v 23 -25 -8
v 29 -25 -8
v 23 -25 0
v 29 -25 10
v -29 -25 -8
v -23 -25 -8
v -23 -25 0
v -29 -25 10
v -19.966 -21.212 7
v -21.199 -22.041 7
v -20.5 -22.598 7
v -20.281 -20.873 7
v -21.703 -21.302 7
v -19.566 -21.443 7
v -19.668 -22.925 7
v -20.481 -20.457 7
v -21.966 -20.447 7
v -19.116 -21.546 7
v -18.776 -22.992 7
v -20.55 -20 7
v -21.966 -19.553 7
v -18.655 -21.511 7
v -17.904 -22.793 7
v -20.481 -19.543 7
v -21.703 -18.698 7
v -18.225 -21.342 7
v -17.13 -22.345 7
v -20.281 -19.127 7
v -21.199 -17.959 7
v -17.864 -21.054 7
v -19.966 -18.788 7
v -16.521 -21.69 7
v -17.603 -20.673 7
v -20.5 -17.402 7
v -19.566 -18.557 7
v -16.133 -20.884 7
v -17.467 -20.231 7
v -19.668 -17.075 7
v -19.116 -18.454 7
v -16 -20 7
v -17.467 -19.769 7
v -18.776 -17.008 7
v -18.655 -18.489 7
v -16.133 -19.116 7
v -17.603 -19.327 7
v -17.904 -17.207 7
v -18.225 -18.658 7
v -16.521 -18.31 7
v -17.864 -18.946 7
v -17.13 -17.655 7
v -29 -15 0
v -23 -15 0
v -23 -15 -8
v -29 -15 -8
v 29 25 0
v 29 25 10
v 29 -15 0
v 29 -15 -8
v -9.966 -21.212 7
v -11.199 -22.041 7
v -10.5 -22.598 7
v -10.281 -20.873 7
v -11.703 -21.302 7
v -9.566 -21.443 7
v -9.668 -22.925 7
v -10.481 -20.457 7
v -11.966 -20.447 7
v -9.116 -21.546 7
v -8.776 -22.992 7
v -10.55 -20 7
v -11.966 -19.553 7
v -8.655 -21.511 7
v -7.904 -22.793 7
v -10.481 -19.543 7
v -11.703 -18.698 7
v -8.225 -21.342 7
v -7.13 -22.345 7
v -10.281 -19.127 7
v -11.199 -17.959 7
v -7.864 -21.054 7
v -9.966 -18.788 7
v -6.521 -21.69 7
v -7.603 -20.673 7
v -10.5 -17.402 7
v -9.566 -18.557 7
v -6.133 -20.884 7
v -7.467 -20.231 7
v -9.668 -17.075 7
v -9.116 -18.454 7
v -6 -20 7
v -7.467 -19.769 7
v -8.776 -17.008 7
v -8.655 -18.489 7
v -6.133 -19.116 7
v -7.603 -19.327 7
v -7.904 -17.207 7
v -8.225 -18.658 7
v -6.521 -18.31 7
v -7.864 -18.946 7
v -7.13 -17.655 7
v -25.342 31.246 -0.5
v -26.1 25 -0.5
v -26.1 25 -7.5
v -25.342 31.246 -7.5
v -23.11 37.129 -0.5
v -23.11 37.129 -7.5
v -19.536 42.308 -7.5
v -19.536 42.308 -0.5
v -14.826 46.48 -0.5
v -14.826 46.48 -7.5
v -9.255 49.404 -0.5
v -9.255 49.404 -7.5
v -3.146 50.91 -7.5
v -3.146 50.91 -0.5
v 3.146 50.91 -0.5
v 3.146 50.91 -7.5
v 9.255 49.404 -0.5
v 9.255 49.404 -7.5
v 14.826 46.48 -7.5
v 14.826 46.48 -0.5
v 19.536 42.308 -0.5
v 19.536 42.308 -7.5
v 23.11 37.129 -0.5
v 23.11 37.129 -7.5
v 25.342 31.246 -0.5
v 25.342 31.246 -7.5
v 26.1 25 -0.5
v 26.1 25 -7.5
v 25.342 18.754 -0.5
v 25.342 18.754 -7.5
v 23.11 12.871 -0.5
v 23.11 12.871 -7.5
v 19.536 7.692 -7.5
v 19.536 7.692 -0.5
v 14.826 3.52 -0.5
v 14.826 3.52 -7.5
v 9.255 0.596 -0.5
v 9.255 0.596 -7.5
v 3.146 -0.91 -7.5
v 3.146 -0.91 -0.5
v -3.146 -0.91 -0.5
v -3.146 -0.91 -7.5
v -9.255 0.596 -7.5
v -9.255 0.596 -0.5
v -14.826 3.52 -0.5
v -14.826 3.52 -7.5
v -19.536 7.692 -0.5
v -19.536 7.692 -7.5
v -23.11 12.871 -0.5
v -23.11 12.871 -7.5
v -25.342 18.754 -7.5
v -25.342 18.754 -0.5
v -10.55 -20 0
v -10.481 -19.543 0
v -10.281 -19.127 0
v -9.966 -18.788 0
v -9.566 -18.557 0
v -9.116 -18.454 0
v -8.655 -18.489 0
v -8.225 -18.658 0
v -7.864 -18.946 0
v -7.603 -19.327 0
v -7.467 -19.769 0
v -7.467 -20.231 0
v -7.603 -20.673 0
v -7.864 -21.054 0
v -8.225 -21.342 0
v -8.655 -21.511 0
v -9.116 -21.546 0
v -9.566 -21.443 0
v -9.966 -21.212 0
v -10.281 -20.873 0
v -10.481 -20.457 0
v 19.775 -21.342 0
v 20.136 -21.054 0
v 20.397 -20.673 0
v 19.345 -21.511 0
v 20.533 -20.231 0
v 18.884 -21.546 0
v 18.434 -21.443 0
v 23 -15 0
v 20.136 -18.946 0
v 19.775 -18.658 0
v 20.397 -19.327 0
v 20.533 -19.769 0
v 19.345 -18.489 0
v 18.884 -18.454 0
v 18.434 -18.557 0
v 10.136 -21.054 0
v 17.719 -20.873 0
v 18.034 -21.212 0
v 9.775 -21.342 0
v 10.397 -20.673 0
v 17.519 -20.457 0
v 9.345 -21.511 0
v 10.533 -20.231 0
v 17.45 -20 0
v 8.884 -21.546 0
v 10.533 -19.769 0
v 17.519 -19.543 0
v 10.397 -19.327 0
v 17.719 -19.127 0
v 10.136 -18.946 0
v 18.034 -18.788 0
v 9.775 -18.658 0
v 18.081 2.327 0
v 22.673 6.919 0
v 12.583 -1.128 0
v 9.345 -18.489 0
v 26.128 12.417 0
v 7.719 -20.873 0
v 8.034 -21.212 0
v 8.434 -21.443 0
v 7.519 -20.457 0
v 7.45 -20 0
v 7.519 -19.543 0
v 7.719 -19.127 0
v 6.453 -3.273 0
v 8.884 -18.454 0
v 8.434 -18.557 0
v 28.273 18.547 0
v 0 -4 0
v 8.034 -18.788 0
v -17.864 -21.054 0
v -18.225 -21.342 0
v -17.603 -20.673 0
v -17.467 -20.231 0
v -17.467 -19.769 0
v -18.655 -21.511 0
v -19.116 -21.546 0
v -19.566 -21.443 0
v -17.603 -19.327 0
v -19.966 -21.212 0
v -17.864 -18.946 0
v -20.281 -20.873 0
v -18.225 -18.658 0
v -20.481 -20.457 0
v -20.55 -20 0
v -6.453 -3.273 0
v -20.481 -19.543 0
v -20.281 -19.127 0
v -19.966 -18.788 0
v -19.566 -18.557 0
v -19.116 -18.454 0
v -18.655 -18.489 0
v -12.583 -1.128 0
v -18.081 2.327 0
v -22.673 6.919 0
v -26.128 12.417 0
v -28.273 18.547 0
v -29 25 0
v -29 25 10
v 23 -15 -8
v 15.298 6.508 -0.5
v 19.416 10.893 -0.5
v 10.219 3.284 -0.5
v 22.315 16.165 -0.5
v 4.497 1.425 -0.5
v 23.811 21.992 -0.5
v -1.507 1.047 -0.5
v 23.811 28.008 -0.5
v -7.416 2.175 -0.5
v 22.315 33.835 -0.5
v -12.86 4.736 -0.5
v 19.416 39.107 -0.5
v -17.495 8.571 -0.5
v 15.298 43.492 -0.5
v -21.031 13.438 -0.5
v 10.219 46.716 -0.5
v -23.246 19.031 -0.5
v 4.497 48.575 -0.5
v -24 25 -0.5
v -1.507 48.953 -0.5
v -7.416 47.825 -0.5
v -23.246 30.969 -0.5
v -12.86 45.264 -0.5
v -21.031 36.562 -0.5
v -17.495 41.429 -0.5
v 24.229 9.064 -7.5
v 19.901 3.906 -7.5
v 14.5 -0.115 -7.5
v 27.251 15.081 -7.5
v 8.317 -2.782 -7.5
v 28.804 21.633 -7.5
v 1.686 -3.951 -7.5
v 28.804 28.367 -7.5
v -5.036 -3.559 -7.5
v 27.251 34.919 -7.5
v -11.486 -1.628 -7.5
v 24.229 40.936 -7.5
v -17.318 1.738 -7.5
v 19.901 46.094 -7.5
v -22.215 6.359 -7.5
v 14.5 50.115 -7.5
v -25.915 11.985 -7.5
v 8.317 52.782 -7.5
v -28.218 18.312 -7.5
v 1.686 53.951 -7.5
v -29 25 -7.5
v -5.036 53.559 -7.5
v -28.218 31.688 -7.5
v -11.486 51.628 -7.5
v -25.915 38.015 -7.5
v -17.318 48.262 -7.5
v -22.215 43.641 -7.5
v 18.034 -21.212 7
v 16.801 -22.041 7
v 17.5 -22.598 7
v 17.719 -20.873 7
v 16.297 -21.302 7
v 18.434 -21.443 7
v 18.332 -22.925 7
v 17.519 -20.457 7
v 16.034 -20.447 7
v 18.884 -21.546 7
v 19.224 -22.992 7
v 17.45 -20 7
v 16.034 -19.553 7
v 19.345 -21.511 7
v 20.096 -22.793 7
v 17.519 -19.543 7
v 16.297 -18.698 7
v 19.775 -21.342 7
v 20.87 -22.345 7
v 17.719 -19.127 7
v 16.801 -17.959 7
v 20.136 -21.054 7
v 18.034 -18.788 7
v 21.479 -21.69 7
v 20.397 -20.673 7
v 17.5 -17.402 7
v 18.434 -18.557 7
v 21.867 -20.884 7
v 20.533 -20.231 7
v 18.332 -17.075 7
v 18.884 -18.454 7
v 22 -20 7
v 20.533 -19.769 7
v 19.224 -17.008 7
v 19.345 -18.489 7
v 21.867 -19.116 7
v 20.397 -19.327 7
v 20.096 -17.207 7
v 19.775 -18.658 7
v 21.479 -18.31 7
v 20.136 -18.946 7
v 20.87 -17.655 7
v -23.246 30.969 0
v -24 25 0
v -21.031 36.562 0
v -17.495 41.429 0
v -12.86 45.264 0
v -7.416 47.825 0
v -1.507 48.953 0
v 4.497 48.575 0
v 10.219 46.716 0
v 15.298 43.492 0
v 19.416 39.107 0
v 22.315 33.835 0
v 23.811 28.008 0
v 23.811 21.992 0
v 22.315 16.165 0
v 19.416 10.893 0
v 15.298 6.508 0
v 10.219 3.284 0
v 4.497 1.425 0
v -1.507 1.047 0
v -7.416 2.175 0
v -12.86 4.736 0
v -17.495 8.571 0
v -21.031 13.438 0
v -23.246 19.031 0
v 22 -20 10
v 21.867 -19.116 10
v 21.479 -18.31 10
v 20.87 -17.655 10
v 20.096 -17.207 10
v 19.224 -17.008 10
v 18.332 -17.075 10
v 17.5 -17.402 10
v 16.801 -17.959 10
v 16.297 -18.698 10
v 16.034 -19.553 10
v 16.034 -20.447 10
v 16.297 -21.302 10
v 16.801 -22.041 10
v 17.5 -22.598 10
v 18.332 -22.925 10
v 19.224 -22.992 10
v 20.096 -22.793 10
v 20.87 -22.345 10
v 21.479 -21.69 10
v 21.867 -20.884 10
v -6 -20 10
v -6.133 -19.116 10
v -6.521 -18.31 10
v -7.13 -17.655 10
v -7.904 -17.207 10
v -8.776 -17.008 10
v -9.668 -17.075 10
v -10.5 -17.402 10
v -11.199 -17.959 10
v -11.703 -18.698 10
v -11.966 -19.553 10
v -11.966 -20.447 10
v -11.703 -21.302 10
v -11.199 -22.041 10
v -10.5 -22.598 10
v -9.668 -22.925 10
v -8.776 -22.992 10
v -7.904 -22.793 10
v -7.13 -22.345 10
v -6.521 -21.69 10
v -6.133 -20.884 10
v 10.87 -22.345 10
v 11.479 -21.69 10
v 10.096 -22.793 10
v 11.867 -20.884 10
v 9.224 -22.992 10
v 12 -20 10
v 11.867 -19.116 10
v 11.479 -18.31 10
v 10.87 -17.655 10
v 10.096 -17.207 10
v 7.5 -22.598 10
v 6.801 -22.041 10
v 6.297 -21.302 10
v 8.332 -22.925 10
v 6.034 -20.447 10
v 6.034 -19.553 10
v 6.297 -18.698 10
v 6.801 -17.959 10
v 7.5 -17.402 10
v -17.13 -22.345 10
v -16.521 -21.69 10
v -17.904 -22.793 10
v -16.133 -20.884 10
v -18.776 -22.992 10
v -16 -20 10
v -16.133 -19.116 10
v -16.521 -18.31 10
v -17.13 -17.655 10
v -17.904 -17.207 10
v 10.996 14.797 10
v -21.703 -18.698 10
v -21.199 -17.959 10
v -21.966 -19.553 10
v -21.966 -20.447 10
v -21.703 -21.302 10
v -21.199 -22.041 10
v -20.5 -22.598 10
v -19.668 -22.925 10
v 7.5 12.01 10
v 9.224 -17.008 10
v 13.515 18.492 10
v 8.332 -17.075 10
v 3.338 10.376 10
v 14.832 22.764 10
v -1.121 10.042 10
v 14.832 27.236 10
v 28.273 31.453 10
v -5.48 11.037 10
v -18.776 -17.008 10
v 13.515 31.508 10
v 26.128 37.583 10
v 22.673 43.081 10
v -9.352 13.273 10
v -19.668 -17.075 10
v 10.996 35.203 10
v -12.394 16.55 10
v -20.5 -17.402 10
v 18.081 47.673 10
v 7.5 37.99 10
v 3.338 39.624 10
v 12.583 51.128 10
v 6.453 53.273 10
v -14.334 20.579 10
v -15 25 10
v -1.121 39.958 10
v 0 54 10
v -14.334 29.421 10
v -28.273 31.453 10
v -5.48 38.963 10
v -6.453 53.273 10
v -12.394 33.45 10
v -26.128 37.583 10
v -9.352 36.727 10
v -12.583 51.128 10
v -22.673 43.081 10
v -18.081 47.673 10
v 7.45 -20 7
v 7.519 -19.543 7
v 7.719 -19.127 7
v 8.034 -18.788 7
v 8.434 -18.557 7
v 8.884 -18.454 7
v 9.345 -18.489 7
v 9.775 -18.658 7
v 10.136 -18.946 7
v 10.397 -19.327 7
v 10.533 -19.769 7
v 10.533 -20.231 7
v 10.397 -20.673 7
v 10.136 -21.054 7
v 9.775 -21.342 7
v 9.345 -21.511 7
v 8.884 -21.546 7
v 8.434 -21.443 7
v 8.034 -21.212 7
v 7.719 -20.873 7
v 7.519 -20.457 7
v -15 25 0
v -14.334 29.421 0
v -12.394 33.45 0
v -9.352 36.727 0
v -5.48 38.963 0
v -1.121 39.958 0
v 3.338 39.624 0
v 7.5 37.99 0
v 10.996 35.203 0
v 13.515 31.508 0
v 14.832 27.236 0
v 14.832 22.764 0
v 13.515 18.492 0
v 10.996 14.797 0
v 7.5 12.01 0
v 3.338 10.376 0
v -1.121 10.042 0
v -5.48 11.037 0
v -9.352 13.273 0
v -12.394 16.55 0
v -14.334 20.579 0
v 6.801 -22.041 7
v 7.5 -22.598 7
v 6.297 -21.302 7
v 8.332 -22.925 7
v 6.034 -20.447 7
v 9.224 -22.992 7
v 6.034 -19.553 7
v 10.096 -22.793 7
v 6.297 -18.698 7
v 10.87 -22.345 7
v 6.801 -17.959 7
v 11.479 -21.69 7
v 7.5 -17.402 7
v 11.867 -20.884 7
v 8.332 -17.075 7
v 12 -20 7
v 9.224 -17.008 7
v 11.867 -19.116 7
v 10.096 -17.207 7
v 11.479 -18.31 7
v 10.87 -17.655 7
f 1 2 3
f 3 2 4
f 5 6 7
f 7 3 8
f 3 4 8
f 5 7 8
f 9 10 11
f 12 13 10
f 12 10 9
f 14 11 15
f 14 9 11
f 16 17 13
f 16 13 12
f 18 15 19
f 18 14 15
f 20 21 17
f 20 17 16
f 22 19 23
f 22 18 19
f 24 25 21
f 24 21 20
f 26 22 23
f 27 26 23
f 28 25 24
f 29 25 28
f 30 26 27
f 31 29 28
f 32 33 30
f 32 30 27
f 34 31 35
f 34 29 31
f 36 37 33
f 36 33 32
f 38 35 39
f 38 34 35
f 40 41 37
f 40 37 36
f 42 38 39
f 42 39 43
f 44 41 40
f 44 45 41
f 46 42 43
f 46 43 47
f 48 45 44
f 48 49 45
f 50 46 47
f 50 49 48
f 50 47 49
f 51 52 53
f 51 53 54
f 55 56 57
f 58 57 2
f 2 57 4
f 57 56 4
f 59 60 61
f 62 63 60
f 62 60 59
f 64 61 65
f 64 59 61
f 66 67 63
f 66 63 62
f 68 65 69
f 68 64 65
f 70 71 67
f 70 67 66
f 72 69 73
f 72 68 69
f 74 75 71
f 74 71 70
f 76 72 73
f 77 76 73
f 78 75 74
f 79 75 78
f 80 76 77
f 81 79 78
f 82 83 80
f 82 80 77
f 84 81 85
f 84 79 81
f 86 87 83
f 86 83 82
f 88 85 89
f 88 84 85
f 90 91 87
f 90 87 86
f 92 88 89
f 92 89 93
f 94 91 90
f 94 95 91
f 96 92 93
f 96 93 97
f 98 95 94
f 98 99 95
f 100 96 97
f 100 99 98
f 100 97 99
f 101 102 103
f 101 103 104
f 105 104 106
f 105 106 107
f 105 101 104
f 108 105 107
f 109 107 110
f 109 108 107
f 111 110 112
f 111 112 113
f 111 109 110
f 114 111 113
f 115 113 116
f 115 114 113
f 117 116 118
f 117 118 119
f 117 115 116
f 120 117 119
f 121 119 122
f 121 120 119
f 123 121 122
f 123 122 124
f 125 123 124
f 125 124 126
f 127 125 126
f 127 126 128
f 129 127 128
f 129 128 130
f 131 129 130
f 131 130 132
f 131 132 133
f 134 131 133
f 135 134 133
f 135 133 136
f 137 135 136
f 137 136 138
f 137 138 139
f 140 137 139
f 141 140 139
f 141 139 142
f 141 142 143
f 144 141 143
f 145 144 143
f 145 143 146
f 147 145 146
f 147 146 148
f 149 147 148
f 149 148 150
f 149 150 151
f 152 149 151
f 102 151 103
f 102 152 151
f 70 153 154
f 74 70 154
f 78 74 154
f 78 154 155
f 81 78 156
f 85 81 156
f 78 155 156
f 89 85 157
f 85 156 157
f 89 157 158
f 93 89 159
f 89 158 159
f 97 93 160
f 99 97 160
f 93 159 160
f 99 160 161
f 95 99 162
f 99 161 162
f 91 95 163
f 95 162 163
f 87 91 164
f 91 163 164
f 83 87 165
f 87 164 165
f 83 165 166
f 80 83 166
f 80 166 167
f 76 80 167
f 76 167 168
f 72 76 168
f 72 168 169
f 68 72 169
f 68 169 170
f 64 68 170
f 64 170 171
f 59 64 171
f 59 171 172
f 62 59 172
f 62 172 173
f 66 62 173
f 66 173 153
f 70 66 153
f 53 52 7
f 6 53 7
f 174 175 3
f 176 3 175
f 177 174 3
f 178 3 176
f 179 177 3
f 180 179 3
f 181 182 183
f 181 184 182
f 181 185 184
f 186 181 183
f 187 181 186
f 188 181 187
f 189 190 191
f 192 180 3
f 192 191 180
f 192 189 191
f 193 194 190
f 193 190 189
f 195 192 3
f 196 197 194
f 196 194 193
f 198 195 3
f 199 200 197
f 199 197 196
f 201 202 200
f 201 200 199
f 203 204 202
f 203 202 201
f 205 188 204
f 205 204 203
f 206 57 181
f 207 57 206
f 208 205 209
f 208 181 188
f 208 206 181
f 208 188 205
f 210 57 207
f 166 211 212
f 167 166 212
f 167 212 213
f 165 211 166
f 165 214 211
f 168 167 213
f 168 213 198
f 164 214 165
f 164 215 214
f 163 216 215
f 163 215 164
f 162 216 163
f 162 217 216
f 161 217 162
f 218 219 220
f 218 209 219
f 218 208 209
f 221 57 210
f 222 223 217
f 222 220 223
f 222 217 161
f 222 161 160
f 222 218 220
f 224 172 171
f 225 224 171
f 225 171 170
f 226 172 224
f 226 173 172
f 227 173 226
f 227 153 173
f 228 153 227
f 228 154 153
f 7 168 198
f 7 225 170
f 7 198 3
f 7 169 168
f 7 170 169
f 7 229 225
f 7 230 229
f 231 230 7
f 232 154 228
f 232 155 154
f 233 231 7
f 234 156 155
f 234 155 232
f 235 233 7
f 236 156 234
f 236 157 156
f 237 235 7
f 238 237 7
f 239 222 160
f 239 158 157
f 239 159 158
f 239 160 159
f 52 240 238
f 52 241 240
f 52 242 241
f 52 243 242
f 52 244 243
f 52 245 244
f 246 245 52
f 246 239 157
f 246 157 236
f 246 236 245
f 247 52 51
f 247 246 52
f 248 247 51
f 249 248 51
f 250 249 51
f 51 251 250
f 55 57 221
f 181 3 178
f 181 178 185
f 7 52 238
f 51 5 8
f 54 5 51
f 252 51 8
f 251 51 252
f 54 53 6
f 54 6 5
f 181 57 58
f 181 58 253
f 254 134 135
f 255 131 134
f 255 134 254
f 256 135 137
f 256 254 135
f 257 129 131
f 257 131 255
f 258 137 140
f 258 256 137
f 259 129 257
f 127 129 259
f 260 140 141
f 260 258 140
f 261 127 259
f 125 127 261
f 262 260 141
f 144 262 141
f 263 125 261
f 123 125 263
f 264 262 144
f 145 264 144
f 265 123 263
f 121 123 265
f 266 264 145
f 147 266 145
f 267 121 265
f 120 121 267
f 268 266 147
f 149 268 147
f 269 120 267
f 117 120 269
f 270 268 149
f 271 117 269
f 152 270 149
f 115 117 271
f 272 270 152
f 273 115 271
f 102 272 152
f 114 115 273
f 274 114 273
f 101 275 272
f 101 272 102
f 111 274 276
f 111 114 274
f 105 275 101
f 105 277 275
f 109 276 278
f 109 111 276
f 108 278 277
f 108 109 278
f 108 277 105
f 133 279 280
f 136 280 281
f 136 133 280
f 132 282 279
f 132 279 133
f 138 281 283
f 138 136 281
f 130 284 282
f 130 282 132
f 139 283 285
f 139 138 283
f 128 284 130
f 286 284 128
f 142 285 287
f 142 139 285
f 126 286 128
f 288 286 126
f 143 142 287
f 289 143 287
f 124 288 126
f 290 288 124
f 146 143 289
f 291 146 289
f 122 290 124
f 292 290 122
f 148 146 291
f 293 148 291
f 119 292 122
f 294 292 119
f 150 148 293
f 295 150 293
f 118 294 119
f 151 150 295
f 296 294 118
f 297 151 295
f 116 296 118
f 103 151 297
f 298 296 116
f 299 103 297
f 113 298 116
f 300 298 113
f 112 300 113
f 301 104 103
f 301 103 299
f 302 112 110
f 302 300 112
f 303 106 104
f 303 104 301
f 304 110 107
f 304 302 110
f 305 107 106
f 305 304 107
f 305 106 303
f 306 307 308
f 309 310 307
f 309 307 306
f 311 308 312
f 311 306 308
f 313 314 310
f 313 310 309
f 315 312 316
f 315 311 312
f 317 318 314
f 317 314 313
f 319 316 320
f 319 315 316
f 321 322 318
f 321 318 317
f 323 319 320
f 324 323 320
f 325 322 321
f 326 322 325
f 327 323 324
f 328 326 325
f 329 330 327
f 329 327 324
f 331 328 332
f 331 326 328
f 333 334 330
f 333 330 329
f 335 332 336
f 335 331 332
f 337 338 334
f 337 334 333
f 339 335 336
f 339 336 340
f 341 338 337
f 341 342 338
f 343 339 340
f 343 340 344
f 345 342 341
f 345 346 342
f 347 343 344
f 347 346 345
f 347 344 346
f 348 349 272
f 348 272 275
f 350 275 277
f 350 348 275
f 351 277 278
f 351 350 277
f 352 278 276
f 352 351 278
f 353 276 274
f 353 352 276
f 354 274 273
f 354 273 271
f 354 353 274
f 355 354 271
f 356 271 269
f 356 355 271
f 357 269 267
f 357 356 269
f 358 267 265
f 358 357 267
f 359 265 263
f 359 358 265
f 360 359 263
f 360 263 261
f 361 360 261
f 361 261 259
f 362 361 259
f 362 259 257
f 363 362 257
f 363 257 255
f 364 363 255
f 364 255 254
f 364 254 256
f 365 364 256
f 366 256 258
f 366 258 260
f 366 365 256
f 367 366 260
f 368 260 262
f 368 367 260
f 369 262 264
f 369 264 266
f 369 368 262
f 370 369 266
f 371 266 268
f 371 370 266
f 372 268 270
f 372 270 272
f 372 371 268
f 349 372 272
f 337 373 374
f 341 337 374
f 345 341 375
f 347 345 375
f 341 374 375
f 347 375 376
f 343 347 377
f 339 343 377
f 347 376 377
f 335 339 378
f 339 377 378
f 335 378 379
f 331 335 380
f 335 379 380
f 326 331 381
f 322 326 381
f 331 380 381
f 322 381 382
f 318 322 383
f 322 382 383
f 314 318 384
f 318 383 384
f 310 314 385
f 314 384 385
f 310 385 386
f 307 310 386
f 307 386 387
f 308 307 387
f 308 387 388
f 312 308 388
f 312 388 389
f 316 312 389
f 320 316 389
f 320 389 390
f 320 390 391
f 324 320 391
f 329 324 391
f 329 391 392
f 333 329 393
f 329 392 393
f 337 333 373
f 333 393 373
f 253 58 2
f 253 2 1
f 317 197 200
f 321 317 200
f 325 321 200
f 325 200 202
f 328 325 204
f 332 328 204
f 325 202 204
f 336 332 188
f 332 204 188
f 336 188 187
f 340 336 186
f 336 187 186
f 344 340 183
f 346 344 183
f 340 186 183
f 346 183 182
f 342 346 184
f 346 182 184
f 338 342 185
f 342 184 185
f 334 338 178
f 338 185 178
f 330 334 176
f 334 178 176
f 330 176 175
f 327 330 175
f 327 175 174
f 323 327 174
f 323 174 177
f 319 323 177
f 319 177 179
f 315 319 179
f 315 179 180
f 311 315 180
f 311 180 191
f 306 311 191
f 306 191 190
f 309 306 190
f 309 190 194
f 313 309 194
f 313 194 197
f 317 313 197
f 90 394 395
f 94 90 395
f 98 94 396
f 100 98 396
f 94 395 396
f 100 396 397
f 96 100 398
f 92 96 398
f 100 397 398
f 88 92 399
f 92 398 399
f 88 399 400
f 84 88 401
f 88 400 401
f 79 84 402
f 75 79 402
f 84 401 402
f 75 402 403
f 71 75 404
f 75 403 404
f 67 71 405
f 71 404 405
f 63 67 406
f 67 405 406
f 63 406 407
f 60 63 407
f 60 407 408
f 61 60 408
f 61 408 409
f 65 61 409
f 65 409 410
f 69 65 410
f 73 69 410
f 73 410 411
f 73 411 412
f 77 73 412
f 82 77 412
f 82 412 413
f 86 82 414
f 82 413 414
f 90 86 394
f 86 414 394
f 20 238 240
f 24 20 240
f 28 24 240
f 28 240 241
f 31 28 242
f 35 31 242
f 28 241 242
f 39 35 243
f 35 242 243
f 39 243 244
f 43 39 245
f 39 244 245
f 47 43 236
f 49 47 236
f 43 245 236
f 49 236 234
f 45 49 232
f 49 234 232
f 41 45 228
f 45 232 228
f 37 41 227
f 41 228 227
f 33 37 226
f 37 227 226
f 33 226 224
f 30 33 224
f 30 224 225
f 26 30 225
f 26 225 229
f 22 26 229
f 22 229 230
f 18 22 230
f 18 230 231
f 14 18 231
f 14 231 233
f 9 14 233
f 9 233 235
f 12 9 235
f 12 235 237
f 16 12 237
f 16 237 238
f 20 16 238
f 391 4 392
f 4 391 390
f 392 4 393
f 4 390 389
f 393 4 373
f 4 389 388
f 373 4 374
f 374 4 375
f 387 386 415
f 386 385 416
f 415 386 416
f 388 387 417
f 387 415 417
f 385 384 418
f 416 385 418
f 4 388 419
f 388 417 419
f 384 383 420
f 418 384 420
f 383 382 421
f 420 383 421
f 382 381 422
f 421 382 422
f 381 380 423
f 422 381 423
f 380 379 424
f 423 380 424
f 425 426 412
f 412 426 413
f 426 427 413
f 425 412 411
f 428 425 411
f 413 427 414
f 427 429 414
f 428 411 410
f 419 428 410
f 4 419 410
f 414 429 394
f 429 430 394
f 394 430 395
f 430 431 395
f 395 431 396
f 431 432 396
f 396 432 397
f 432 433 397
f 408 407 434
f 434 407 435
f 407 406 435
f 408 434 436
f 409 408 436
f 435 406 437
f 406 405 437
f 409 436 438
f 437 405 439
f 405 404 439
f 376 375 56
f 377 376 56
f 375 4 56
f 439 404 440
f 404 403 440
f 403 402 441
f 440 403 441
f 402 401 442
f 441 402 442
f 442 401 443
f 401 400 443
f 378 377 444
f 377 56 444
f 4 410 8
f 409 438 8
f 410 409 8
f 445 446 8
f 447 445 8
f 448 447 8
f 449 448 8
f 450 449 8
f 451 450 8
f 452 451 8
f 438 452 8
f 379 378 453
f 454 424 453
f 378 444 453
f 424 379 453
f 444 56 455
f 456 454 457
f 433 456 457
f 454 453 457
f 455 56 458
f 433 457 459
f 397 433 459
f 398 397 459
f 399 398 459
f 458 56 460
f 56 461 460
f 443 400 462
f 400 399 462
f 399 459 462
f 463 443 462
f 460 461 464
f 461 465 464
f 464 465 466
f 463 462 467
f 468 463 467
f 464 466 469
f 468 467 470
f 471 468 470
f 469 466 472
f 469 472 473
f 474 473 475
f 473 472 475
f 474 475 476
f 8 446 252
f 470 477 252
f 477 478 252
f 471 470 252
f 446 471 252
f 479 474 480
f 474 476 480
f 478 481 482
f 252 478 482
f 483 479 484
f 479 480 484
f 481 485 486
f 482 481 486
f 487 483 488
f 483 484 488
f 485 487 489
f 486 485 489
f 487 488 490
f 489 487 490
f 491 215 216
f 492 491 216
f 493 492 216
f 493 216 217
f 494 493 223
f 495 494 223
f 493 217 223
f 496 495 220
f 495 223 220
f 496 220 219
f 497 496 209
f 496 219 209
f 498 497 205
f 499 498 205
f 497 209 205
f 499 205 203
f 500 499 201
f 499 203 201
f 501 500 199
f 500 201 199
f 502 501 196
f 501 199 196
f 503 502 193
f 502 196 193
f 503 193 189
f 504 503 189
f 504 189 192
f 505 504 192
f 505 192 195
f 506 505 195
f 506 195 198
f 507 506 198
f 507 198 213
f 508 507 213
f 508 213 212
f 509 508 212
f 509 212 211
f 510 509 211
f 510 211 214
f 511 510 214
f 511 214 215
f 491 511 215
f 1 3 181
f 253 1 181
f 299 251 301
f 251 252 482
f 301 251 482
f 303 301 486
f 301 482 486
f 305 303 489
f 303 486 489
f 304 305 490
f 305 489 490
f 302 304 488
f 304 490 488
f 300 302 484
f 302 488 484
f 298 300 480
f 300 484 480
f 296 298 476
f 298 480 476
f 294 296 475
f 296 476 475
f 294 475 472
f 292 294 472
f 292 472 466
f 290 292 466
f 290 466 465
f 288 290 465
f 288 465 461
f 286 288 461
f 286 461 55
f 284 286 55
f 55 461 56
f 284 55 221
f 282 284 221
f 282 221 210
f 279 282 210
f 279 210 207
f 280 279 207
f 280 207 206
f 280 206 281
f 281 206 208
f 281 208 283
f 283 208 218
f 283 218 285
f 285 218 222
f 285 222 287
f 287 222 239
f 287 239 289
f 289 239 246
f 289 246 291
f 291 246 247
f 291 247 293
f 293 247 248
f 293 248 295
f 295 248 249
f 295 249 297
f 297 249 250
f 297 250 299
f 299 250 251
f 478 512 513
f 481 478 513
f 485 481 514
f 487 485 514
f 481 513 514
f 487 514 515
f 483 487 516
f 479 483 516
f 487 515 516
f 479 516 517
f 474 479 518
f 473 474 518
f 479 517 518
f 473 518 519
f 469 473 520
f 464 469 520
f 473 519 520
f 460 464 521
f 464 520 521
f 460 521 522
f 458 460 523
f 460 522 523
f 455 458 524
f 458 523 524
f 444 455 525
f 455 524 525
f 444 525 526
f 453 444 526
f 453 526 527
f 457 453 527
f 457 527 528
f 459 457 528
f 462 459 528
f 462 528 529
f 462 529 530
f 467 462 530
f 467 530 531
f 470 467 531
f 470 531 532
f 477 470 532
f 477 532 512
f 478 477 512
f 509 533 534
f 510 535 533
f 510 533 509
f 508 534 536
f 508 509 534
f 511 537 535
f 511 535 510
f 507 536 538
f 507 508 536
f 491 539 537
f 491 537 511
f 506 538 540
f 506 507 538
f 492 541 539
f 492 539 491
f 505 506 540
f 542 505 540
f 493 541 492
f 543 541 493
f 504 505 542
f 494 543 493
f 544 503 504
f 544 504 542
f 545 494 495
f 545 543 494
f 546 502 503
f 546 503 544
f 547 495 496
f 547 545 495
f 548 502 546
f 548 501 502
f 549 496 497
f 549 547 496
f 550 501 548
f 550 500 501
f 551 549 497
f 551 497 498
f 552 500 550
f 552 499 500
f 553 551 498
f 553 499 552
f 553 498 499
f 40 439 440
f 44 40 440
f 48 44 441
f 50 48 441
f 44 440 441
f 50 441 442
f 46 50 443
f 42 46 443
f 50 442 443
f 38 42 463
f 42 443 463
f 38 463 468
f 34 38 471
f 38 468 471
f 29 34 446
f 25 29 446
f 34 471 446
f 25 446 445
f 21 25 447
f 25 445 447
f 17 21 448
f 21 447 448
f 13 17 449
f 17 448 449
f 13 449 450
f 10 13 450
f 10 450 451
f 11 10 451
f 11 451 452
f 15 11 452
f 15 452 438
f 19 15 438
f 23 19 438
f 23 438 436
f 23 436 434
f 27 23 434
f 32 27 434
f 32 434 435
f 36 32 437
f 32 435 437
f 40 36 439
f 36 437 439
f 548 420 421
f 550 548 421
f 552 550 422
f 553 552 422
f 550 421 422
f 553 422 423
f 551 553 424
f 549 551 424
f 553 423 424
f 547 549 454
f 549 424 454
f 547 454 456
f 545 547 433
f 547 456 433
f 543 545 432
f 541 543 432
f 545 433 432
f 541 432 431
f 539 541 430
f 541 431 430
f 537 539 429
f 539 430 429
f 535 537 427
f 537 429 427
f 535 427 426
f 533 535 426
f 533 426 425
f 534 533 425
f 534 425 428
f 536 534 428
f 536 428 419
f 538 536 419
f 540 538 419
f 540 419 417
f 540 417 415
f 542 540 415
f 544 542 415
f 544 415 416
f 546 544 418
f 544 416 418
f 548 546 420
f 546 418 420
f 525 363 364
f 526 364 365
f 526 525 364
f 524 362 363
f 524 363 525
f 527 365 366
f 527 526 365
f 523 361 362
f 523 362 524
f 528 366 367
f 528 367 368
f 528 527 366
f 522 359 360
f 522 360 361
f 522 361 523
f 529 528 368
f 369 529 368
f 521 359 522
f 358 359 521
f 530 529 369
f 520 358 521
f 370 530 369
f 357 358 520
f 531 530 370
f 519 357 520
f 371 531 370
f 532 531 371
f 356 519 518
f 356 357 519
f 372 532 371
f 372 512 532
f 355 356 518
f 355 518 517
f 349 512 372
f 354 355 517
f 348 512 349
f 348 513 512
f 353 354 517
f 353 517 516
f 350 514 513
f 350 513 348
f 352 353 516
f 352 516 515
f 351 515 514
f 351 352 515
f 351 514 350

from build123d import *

# Parameters (mm, degrees)
SKETCH_1_W          = 58
SKETCH_1_H          = 50
EXTRUDE_1_DEPTH     = 10
SKETCH_2_R          = 29
SKETCH_2_R_2        = 26.1
EXTRUDE_2_DEPTH     = 7.5
SKETCH_3_R          = 26.1
SKETCH_3_R_2        = 24
EXTRUDE_3_DEPTH     = 0.5
SKETCH_4_W          = 6
SKETCH_4_H          = 5
EXTRUDE_4_DEPTH     = 8
CUT_EXTRUDE_1_REACH = 12
SKETCH_5_R          = 1.55
SKETCH_6_R          = 3
CUT_EXTRUDE_2_DEPTH = 3
SKETCH_7_R          = 15
CUT_EXTRUDE_3_DEPTH = 11


with BuildPart() as part:
    # 草图1 → 凸台-拉伸1 (new body)
    with BuildSketch(Plane.XY):
        with BuildLine():
            ThreePointArc((-29, 25), (0, 54), (29, 25))
            Line((29, 25), (-29, 25))
        make_face()
        Rectangle(SKETCH_1_W, SKETCH_1_H)
    extrude(amount=EXTRUDE_1_DEPTH)

    # 草图2 → 凸台-拉伸2 (add)
    with BuildSketch(Plane(origin=(0, 0, 0), x_dir=(-1, 0, 0), z_dir=(0, 0, -1))):
        with Locations((0, 25)):
            Circle(SKETCH_2_R)
        with Locations((0, 25)):
            Circle(SKETCH_2_R_2, mode=Mode.SUBTRACT)
    extrude(amount=EXTRUDE_2_DEPTH)

    # 草图3 → 凸台-拉伸3 (add)
    with BuildSketch(Plane(origin=(0, 0, 0), x_dir=(-1, 0, 0), z_dir=(0, 0, -1))):
        with Locations((0, 25)):
            Circle(SKETCH_3_R)
        with Locations((0, 25)):
            Circle(SKETCH_3_R_2, mode=Mode.SUBTRACT)
    extrude(amount=EXTRUDE_3_DEPTH)

    # 草图4 → 凸台-拉伸4 (add)
    with BuildSketch(Plane(origin=(0, 0, 0), x_dir=(-1, 0, 0), z_dir=(0, 0, -1))):
        with Locations((-26, -17.5)):
            Rectangle(SKETCH_4_W, SKETCH_4_H)
        with Locations((-26, -22.5)):
            Rectangle(SKETCH_4_W, SKETCH_4_H)
        with Locations((26, -17.5)):
            Rectangle(SKETCH_4_W, SKETCH_4_H)
        with Locations((26, -22.5)):
            Rectangle(SKETCH_4_W, SKETCH_4_H)
    extrude(amount=EXTRUDE_4_DEPTH)

    # 草图5 → 切除-拉伸1 (cut, up to next)
    with BuildSketch(Plane(origin=(0, 0, 0), x_dir=(-1, 0, 0), z_dir=(0, 0, -1)), mode=Mode.PRIVATE) as cut_extrude_1_sk1:
        with Locations((-19, -20)):
            Circle(SKETCH_5_R)
    cut_extrude_1_tool1 = extrude(cut_extrude_1_sk1.sketch, amount=-CUT_EXTRUDE_1_REACH, mode=Mode.PRIVATE) & part.part
    add(cut_extrude_1_tool1.solids().sort_by_distance((19, -20, 0))[0], mode=Mode.SUBTRACT)
    # 草图5 → 切除-拉伸1 (cut, up to next)
    with BuildSketch(Plane(origin=(0, 0, 0), x_dir=(-1, 0, 0), z_dir=(0, 0, -1)), mode=Mode.PRIVATE) as cut_extrude_1_sk2:
        with Locations((-9, -20)):
            Circle(SKETCH_5_R)
    cut_extrude_1_tool2 = extrude(cut_extrude_1_sk2.sketch, amount=-CUT_EXTRUDE_1_REACH, mode=Mode.PRIVATE) & part.part
    add(cut_extrude_1_tool2.solids().sort_by_distance((9, -20, 0))[0], mode=Mode.SUBTRACT)
    # 草图5 → 切除-拉伸1 (cut, up to next)
    with BuildSketch(Plane(origin=(0, 0, 0), x_dir=(-1, 0, 0), z_dir=(0, 0, -1)), mode=Mode.PRIVATE) as cut_extrude_1_sk3:
        with Locations((9, -20)):
            Circle(SKETCH_5_R)
    cut_extrude_1_tool3 = extrude(cut_extrude_1_sk3.sketch, amount=-CUT_EXTRUDE_1_REACH, mode=Mode.PRIVATE) & part.part
    add(cut_extrude_1_tool3.solids().sort_by_distance((-9, -20, 0))[0], mode=Mode.SUBTRACT)
    # 草图5 → 切除-拉伸1 (cut, up to next)
    with BuildSketch(Plane(origin=(0, 0, 0), x_dir=(-1, 0, 0), z_dir=(0, 0, -1)), mode=Mode.PRIVATE) as cut_extrude_1_sk4:
        with Locations((19, -20)):
            Circle(SKETCH_5_R)
    cut_extrude_1_tool4 = extrude(cut_extrude_1_sk4.sketch, amount=-CUT_EXTRUDE_1_REACH, mode=Mode.PRIVATE) & part.part
    add(cut_extrude_1_tool4.solids().sort_by_distance((-19, -20, 0))[0], mode=Mode.SUBTRACT)

    # 草图6 → 切除-拉伸2 (cut)
    with BuildSketch(Plane.XY.offset(10)):
        with Locations((19, -20)):
            Circle(SKETCH_6_R)
        with Locations((9, -20)):
            Circle(SKETCH_6_R)
        with Locations((-9, -20)):
            Circle(SKETCH_6_R)
        with Locations((-19, -20)):
            Circle(SKETCH_6_R)
    extrude(amount=-CUT_EXTRUDE_2_DEPTH, mode=Mode.SUBTRACT)

    # 草图7 → 切除-拉伸3 (cut, through all)
    with BuildSketch(Plane(origin=(0, 0, 0), x_dir=(-1, 0, 0), z_dir=(0, 0, -1))):
        with Locations((0, 25)):
            Circle(SKETCH_7_R)
    extrude(amount=-CUT_EXTRUDE_3_DEPTH, mode=Mode.SUBTRACT)


solid = part.part
